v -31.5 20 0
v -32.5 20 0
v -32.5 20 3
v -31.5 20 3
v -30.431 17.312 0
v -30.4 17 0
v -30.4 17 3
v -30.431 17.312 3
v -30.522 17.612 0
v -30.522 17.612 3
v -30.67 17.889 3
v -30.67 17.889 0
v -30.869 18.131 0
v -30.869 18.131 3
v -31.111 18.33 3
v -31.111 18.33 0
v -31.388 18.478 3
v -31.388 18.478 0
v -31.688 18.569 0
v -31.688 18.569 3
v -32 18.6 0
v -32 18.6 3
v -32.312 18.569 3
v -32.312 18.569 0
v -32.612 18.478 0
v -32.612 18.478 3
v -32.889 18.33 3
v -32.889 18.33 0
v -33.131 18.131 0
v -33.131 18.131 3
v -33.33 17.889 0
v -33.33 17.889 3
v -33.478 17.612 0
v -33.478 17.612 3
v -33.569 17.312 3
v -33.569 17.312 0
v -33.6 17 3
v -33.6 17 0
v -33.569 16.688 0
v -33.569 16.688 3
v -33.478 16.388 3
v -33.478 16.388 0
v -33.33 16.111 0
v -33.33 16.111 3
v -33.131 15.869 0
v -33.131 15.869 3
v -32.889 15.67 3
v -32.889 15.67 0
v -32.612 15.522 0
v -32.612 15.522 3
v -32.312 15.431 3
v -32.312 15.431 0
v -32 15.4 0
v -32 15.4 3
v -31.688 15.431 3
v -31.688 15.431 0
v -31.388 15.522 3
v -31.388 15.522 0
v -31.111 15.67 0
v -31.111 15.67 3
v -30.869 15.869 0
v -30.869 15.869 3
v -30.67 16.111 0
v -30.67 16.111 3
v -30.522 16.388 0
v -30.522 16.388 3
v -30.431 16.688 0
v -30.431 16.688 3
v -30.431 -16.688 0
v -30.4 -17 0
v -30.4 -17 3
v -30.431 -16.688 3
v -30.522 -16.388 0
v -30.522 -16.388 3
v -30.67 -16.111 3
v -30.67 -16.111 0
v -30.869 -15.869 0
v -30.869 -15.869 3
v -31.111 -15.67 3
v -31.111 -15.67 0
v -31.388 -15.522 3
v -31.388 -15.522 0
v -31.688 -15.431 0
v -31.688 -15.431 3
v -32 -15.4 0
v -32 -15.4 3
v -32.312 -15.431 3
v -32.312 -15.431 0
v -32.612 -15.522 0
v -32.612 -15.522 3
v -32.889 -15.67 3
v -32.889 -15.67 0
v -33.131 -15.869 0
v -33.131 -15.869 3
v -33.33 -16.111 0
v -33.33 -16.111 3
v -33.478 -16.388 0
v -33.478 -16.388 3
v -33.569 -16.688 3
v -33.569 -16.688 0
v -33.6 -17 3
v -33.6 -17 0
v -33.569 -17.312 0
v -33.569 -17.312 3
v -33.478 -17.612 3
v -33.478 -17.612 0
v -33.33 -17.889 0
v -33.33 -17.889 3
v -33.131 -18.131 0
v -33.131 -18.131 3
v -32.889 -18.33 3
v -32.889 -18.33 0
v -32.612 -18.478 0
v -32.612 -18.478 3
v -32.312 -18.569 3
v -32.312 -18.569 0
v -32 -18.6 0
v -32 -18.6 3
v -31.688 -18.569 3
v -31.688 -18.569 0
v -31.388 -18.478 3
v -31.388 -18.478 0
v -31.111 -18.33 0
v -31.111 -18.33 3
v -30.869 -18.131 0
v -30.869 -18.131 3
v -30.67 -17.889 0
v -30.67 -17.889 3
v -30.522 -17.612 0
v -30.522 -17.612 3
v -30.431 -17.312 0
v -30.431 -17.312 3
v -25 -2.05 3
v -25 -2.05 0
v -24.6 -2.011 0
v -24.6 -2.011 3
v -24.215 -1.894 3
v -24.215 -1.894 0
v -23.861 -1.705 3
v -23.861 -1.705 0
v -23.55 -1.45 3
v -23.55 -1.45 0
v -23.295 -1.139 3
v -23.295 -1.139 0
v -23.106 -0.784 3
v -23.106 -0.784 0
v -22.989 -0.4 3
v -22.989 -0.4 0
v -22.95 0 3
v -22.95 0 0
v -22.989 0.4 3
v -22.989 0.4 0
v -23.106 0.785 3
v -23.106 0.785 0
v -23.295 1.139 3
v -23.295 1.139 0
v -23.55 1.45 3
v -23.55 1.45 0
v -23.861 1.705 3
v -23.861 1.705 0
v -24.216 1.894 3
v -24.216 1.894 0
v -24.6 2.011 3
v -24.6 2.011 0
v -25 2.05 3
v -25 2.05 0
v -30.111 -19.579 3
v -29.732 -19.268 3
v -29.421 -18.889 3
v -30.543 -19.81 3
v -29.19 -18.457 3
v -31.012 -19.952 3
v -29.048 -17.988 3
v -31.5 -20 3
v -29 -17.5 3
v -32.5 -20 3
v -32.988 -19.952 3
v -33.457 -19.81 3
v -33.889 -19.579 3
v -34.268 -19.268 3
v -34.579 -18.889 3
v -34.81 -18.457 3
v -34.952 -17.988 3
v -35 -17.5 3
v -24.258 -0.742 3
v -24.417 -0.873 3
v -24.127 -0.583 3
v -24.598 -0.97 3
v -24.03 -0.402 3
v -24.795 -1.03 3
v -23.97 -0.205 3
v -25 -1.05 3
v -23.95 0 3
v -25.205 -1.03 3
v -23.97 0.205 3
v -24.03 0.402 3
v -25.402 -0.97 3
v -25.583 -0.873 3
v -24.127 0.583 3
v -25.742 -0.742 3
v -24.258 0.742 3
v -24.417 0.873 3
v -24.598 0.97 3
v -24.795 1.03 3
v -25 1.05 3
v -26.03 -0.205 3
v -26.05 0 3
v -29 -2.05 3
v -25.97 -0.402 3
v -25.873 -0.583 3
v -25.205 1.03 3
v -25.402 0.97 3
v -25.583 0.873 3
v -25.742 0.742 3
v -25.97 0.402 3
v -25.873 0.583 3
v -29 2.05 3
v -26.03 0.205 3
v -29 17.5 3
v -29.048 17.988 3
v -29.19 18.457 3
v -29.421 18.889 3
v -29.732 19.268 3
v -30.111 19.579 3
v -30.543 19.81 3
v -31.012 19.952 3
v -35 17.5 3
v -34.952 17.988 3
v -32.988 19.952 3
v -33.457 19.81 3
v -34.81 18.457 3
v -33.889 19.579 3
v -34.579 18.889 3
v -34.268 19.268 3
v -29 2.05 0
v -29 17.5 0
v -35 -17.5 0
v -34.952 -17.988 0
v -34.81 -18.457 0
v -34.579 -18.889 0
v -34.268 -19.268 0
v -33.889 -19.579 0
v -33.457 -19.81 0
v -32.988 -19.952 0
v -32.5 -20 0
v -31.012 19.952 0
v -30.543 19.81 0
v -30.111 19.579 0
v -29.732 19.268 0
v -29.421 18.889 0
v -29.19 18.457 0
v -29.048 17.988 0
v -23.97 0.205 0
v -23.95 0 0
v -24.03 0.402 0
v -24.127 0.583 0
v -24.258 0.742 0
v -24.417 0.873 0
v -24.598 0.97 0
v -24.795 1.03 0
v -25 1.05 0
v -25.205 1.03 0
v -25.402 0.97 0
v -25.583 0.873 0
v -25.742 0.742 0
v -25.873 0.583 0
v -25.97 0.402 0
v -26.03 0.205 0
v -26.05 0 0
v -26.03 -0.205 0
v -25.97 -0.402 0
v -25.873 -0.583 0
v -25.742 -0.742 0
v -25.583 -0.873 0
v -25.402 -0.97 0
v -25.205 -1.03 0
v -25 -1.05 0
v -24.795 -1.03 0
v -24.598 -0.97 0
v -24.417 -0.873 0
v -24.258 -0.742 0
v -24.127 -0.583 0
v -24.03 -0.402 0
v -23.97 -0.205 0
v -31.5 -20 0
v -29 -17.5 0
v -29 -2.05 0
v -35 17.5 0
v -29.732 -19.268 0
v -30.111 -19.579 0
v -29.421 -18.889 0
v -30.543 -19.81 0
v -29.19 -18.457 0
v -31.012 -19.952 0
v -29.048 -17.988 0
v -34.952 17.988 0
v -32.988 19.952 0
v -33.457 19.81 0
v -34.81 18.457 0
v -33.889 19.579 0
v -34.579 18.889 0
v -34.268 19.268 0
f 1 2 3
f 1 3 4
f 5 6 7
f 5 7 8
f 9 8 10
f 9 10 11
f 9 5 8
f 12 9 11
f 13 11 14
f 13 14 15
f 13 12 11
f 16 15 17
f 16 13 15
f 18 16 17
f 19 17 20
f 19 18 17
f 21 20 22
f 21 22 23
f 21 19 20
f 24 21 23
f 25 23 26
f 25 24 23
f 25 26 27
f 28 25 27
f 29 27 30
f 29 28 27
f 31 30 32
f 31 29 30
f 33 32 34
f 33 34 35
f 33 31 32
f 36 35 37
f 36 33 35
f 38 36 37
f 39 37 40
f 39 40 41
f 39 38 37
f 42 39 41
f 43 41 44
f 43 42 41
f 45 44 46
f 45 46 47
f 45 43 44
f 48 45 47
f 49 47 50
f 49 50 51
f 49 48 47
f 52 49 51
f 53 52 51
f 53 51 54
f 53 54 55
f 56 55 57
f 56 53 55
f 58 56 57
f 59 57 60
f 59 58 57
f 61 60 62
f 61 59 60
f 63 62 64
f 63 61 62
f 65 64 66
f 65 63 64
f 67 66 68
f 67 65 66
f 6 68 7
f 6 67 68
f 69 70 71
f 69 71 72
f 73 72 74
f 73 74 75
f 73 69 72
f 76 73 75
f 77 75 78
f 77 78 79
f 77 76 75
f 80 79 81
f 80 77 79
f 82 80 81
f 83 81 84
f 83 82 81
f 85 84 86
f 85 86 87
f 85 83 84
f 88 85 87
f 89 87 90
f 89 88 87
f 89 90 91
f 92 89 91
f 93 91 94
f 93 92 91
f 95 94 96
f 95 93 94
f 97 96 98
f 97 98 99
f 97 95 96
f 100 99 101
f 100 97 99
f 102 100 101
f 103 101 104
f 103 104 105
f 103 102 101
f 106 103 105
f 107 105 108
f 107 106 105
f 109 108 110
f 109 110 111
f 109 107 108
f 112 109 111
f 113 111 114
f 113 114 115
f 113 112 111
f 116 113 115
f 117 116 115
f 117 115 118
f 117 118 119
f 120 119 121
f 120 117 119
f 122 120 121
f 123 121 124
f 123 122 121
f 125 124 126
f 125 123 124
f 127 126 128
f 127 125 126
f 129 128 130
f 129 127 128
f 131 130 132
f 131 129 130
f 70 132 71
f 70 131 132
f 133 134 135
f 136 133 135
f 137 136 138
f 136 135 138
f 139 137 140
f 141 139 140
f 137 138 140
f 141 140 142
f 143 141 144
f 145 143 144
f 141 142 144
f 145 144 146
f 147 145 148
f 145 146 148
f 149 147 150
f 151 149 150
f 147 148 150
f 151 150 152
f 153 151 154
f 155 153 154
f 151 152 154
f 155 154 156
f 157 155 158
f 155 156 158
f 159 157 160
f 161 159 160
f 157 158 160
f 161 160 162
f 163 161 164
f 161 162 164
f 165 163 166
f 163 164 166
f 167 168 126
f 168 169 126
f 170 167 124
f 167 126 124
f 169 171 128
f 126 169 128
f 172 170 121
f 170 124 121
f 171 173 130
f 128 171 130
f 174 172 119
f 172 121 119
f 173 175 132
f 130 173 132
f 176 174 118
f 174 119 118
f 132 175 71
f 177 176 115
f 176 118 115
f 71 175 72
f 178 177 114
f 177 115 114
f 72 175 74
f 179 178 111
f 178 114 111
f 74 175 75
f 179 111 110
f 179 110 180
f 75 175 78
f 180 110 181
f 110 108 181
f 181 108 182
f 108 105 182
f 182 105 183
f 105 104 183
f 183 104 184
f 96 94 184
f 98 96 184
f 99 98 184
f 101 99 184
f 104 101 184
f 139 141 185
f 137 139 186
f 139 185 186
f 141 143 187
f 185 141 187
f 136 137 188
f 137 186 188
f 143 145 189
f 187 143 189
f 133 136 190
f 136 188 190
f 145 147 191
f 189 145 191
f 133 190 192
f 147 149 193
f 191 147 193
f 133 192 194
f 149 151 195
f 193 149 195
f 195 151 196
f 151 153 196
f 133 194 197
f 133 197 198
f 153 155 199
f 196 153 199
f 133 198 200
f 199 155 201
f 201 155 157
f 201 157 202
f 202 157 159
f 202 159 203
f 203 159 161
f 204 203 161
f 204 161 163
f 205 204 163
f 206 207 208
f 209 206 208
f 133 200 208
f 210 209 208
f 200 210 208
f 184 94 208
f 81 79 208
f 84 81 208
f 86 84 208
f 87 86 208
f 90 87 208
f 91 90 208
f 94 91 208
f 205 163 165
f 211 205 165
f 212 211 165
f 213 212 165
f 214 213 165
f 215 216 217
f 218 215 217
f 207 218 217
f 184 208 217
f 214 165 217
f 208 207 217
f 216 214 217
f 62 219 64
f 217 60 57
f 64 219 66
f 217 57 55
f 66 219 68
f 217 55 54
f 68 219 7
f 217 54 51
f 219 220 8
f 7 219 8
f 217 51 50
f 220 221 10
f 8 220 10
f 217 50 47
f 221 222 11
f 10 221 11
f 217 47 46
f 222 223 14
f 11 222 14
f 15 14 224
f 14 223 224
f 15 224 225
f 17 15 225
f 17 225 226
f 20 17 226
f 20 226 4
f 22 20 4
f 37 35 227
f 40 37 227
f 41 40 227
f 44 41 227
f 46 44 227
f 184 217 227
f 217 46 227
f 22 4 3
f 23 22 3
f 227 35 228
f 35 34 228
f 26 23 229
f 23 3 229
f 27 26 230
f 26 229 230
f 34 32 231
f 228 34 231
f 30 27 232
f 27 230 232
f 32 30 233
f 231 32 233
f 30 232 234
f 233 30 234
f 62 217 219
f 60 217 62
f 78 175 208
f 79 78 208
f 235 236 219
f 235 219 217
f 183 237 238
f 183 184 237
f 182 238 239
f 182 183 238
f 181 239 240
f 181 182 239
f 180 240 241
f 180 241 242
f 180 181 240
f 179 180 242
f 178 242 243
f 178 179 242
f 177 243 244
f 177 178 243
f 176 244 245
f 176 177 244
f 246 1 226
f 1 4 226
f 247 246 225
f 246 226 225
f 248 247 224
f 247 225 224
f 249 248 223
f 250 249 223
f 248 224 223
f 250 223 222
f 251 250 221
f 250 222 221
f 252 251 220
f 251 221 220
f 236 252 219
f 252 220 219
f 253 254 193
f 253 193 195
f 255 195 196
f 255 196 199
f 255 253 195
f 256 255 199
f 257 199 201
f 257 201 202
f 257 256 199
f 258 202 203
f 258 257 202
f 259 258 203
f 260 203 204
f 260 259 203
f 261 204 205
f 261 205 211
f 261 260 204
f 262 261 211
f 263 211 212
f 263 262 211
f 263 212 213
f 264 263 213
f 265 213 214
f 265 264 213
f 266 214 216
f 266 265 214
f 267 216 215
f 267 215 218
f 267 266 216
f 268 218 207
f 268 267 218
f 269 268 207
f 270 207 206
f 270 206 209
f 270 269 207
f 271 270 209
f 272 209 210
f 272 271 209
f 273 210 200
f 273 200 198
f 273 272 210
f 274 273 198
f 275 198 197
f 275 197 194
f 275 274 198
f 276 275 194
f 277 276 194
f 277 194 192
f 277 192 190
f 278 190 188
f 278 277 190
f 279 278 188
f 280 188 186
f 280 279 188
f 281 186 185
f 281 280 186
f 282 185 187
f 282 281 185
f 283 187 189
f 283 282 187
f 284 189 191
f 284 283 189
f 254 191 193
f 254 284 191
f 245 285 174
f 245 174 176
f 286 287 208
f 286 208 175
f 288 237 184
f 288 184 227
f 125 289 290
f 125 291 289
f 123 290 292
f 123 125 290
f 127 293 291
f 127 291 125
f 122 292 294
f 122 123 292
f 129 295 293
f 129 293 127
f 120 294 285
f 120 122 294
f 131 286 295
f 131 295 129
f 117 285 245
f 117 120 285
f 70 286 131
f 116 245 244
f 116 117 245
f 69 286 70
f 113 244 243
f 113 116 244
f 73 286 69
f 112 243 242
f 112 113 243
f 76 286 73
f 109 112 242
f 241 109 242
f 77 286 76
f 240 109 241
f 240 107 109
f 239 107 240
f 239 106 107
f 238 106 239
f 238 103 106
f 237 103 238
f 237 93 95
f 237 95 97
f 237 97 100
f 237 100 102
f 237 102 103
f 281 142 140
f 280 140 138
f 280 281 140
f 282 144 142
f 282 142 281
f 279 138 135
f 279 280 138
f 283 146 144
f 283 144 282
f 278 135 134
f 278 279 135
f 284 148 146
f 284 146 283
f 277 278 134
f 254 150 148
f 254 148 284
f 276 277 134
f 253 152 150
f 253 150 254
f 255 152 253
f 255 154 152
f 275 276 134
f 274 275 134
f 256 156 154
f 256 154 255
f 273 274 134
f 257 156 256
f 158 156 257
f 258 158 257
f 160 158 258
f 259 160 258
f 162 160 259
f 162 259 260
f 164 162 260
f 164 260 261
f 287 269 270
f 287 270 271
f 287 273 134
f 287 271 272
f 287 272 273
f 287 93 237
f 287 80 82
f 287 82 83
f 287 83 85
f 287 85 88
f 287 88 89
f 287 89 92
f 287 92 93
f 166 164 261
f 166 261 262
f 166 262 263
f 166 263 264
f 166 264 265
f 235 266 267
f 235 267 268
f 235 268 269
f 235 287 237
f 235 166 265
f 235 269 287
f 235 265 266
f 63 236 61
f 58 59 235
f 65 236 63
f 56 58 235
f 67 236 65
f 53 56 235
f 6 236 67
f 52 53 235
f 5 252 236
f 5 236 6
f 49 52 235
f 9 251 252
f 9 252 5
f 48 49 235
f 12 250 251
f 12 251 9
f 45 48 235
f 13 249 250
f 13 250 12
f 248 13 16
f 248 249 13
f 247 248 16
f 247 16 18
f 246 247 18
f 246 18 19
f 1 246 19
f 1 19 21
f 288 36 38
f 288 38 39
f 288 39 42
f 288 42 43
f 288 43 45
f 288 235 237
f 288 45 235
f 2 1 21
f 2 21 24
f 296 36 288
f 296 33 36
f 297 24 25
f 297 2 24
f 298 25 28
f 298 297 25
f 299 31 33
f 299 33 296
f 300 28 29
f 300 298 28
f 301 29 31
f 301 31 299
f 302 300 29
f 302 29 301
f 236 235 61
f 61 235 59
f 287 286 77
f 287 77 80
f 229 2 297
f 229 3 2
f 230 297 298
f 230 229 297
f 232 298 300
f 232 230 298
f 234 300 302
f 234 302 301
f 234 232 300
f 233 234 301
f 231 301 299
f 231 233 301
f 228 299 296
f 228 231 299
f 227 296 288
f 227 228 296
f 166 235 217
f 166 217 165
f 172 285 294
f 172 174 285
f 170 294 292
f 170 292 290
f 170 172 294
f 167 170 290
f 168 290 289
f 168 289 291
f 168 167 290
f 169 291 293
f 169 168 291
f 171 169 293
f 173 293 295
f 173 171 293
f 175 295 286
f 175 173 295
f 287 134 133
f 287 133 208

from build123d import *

# Parameters (mm, degrees)
SKETCH_R   = 1.6
SKETCH_R_2 = 1.05
PAD_DEPTH  = 3
FILLET_R   = 2.5


with BuildPart() as part:
    # Sketch → Pad (new body)
    with BuildSketch(Plane.XY):
        with BuildLine():
            Line((-35, 20), (-29, 20))
            Line((-29, 20), (-29, 2.05))
            Line((-29, 2.05), (-25, 2.05))
            ThreePointArc((-24.999986, -2.05), (-22.95, 7e-06), (-25, 2.05))
            Line((-24.999986, -2.05), (-29, -2.05))
            Line((-29, -2.05), (-29, -20))
            Line((-29, -20), (-35, -20))
            Line((-35, -20), (-35, 20))
        make_face()
        with Locations((-32, 17)):
            Circle(SKETCH_R, mode=Mode.SUBTRACT)
        with Locations((-32, -17)):
            Circle(SKETCH_R, mode=Mode.SUBTRACT)
        with Locations((-25, 0)):
            Circle(SKETCH_R_2, mode=Mode.SUBTRACT)
    extrude(amount=PAD_DEPTH)

    # Fillet
    fillet_edges = [part.edges().sort_by_distance(p)[0] for p in [
        (-29, -20, 1.5),
        (-35, -20, 1.5),
        (-29, 20, 1.5),
        (-35, 20, 1.5),
    ]]
    fillet(fillet_edges, radius=FILLET_R)


solid = part.part
